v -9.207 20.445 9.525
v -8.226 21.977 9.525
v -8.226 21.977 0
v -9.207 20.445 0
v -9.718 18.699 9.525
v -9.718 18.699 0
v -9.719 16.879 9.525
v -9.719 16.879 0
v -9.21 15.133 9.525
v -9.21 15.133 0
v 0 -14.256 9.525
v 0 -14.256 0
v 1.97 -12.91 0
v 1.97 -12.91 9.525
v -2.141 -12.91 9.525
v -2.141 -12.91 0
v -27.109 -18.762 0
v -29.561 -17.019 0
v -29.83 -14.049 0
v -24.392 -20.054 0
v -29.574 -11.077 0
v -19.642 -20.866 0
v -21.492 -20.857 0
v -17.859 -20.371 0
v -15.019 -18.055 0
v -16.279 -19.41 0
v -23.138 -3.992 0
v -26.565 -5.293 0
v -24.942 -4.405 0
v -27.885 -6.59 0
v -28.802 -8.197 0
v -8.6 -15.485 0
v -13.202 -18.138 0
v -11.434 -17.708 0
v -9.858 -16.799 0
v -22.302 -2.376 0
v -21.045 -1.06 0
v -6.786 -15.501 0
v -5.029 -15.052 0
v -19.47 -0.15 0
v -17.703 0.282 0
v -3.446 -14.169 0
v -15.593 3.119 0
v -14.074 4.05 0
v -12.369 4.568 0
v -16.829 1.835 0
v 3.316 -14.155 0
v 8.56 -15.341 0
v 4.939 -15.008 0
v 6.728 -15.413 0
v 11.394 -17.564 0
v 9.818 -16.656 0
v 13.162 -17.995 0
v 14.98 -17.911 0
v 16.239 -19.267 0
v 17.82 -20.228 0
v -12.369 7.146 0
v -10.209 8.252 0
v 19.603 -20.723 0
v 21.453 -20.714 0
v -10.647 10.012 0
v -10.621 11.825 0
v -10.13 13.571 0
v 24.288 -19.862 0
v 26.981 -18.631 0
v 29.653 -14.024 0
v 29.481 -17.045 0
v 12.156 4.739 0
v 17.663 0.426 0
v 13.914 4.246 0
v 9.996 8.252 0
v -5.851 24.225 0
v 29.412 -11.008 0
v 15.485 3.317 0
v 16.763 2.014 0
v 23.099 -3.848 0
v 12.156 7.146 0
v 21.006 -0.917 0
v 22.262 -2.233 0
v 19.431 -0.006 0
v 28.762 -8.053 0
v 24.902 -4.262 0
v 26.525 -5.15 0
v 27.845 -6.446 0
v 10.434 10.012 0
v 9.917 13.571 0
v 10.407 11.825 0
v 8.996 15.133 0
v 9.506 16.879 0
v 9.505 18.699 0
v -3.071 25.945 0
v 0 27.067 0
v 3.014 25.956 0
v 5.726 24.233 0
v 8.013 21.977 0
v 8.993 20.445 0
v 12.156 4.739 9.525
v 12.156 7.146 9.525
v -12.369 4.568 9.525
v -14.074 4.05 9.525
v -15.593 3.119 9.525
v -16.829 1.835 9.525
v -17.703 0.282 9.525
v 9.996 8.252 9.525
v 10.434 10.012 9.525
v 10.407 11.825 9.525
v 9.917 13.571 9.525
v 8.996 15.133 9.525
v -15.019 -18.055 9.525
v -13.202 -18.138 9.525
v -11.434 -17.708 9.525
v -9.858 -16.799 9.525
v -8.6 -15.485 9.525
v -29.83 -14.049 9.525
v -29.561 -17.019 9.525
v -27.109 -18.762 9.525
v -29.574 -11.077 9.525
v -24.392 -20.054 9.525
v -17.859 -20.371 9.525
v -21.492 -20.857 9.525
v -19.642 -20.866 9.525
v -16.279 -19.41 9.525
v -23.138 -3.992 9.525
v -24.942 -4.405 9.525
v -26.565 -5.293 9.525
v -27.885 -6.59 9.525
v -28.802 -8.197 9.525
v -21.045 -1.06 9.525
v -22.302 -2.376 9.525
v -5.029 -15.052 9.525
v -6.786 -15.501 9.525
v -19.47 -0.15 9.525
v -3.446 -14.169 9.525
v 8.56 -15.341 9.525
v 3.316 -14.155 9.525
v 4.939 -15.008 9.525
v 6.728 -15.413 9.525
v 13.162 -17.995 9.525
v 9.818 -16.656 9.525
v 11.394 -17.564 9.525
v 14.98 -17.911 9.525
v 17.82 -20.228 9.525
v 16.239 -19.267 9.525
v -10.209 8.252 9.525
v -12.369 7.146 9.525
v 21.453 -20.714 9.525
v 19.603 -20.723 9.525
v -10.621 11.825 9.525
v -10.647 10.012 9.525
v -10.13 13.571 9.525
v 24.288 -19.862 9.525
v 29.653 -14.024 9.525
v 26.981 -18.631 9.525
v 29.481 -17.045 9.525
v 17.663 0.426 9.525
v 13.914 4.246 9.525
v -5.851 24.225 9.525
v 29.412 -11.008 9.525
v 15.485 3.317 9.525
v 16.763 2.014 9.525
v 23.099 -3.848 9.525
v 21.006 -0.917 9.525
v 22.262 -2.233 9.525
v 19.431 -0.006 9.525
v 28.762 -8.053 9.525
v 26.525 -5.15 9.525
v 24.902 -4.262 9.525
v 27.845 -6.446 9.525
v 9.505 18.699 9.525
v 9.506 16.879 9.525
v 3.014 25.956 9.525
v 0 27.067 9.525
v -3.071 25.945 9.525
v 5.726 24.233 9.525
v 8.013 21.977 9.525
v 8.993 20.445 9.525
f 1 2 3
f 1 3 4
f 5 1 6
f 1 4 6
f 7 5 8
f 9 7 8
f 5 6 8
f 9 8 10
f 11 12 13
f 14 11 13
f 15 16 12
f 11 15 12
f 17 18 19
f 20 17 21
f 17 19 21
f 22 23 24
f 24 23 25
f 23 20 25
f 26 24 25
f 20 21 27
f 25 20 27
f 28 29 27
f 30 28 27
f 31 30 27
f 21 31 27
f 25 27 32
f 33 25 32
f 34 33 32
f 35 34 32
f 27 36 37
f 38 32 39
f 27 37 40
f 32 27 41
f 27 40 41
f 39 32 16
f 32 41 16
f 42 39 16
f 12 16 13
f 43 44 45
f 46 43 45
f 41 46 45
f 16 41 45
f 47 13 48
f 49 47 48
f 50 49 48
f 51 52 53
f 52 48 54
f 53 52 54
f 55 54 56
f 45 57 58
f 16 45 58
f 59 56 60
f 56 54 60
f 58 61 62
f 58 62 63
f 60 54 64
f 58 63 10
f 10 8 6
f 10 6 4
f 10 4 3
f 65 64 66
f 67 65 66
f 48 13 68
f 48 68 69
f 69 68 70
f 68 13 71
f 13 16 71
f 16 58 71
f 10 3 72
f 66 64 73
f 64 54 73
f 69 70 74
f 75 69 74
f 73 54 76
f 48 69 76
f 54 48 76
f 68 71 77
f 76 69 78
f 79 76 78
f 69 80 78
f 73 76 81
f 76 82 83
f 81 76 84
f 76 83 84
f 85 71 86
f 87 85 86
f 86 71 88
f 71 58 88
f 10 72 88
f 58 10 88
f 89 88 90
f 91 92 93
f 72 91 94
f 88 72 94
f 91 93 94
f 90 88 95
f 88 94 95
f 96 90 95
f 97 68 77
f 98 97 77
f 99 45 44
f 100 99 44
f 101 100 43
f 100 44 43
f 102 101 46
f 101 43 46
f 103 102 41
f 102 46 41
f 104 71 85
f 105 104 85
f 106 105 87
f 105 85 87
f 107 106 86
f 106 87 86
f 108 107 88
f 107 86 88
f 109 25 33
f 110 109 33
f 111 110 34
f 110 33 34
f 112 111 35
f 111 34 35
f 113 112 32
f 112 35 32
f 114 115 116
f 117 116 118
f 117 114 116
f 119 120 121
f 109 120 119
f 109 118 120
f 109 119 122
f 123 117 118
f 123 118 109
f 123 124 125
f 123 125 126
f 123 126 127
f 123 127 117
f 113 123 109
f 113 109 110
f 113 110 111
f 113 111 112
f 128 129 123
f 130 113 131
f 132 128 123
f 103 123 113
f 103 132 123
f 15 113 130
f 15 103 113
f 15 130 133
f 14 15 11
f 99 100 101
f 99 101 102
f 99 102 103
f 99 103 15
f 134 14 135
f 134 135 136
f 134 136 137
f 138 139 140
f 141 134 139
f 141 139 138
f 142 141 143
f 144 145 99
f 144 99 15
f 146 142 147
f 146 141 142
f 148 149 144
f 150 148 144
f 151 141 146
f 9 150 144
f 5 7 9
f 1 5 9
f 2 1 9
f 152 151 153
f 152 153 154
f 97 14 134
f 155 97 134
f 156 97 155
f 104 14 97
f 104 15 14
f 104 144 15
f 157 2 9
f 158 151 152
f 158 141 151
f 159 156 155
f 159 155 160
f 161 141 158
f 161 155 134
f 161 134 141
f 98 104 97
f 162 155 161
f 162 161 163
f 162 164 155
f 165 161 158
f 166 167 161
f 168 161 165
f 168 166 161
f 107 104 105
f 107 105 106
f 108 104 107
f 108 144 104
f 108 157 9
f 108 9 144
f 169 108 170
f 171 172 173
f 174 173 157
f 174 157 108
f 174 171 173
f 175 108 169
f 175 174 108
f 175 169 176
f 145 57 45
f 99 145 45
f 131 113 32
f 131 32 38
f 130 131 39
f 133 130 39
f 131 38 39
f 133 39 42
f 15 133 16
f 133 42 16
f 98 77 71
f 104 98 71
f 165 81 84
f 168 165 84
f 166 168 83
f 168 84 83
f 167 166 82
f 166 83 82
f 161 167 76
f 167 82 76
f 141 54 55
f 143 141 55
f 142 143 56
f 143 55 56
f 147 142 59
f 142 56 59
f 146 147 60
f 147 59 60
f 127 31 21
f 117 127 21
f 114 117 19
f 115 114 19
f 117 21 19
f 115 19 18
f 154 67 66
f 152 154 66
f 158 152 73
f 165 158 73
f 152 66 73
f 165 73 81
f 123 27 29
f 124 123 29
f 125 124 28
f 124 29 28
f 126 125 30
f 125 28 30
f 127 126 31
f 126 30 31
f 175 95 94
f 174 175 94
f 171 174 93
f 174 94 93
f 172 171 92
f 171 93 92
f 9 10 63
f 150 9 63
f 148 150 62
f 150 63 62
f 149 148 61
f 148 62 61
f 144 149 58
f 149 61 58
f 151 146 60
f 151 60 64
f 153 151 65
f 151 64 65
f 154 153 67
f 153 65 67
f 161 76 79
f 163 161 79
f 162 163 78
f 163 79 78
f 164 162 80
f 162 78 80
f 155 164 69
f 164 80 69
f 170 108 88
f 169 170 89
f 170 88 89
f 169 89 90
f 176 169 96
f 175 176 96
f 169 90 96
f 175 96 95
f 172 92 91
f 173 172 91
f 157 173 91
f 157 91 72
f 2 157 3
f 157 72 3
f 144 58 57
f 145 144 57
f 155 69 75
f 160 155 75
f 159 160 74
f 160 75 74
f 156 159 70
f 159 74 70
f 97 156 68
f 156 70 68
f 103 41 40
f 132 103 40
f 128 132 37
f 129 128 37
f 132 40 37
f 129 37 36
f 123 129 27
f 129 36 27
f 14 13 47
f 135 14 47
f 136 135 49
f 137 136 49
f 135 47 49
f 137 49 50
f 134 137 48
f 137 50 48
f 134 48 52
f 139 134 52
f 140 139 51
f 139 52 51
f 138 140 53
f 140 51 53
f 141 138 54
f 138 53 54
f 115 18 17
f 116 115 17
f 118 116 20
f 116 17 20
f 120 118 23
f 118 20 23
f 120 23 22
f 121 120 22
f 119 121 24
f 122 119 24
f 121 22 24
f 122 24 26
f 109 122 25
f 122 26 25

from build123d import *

# Parameters (mm, degrees)
F1_DEPTH = 9.525


# Not quite as in the source:
# - a length typed as a fraction of an inch, garbled in the dataset ("3 / 203.2 mm" for 3/8 in), is restored


with BuildPart() as f1:
    # F0 (on Top) → F1 (new body)
    with BuildSketch(Plane.XY):
        with BuildLine():
            ThreePointArc((0, 27.0671695471), (-4.5048536548, 25.1556778504), (-8.2258973271, 21.977417171))
            ThreePointArc((-8.2258973271, 21.977417171), (-9.7181261566, 18.698842434), (-9.2097157612, 15.1327075437))
            ThreePointArc((-9.2097157612, 15.1327075437), (-10.6205392688, 11.8246856933), (-10.2093555033, 8.2519613206))
            Line((-10.2093555033, 8.2519613206), (-12.369341217, 7.1464567445))
            Line((-12.369341217, 7.1464567445), (-12.369341217, 4.6386048198))
            Line((-12.369341217, 4.6386048198), (-12.369341217, 4.5682978211))
            ThreePointArc((-12.369341217, 4.5682978211), (-15.5930977879, 3.1185654947), (-17.7027139134, 0.2823972963))
            ThreePointArc((-17.7027139134, 0.2823972963), (-21.0452825194, -1.0603738309), (-23.1384971151, -3.9919692741))
            ThreePointArc((-23.1384971151, -3.9919692741), (-26.5647165348, -5.2934051439), (-28.80180468, -8.19653302))
            ThreePointArc((-28.80180468, -8.19653302), (-29.7673344436, -12.5572908836), (-29.5614041388, -17.0189104974))
            ThreePointArc((-29.5614041388, -17.0189104974), (-25.7783661022, -19.4669407743), (-21.4921734029, -20.8571857766))
            ThreePointArc((-21.4921734029, -20.8571857766), (-17.8594468391, -20.3713745504), (-15.0192606046, -18.054899429))
            ThreePointArc((-15.0192606046, -18.054899429), (-11.4338171794, -17.7079201351), (-8.5996589687, -15.484556372))
            ThreePointArc((-8.5996589687, -15.484556372), (-5.0294162563, -15.0523544446), (-2.1409380715, -12.9098966718))
            Line((-2.1409380715, -12.9098966718), (0, -14.2561570176))
            Line((0, -14.2561570176), (1.9696742658, -12.9098966718))
            ThreePointArc((1.9696742658, -12.9098966718), (4.9392756736, -15.0084468105), (8.560301624, -15.3410370587))
            ThreePointArc((8.560301624, -15.3410370587), (11.3944598347, -17.5644008218), (14.9799032599, -17.9113801157))
            ThreePointArc((14.9799032599, -17.9113801157), (17.8200894944, -20.2278552371), (21.4528160582, -20.7136664634))
            ThreePointArc((21.4528160582, -20.7136664634), (25.6558468929, -19.2922500665), (29.4813849032, -17.0447733253))
            ThreePointArc((29.4813849032, -17.0447733253), (29.5836204245, -12.511977875), (28.7624473353, -8.0530137067))
            ThreePointArc((28.7624473353, -8.0530137067), (26.5253591901, -5.1498858306), (23.0991397704, -3.8484499608))
            ThreePointArc((23.0991397704, -3.8484499608), (21.0059251747, -0.9168545176), (17.6633565687, 0.4259166096))
            ThreePointArc((17.6633565687, 0.4259166096), (15.4847616458, 3.3168082822), (12.1560195839, 4.739132713))
            Line((12.1560195839, 4.739132713), (12.1560195839, 7.1464567445))
            Line((12.1560195839, 7.1464567445), (9.9960338703, 8.2519613206))
            ThreePointArc((9.9960338703, 8.2519613206), (10.4072176357, 11.8246856933), (8.9963941282, 15.1327075437))
            ThreePointArc((8.9963941282, 15.1327075437), (9.5048045235, 18.698842434), (8.012575694, 21.977417171))
            ThreePointArc((8.012575694, 21.977417171), (4.4155385291, 25.1665589), (0, 27.0671695471))
        make_face()
    extrude(amount=F1_DEPTH)


solid = f1.part
